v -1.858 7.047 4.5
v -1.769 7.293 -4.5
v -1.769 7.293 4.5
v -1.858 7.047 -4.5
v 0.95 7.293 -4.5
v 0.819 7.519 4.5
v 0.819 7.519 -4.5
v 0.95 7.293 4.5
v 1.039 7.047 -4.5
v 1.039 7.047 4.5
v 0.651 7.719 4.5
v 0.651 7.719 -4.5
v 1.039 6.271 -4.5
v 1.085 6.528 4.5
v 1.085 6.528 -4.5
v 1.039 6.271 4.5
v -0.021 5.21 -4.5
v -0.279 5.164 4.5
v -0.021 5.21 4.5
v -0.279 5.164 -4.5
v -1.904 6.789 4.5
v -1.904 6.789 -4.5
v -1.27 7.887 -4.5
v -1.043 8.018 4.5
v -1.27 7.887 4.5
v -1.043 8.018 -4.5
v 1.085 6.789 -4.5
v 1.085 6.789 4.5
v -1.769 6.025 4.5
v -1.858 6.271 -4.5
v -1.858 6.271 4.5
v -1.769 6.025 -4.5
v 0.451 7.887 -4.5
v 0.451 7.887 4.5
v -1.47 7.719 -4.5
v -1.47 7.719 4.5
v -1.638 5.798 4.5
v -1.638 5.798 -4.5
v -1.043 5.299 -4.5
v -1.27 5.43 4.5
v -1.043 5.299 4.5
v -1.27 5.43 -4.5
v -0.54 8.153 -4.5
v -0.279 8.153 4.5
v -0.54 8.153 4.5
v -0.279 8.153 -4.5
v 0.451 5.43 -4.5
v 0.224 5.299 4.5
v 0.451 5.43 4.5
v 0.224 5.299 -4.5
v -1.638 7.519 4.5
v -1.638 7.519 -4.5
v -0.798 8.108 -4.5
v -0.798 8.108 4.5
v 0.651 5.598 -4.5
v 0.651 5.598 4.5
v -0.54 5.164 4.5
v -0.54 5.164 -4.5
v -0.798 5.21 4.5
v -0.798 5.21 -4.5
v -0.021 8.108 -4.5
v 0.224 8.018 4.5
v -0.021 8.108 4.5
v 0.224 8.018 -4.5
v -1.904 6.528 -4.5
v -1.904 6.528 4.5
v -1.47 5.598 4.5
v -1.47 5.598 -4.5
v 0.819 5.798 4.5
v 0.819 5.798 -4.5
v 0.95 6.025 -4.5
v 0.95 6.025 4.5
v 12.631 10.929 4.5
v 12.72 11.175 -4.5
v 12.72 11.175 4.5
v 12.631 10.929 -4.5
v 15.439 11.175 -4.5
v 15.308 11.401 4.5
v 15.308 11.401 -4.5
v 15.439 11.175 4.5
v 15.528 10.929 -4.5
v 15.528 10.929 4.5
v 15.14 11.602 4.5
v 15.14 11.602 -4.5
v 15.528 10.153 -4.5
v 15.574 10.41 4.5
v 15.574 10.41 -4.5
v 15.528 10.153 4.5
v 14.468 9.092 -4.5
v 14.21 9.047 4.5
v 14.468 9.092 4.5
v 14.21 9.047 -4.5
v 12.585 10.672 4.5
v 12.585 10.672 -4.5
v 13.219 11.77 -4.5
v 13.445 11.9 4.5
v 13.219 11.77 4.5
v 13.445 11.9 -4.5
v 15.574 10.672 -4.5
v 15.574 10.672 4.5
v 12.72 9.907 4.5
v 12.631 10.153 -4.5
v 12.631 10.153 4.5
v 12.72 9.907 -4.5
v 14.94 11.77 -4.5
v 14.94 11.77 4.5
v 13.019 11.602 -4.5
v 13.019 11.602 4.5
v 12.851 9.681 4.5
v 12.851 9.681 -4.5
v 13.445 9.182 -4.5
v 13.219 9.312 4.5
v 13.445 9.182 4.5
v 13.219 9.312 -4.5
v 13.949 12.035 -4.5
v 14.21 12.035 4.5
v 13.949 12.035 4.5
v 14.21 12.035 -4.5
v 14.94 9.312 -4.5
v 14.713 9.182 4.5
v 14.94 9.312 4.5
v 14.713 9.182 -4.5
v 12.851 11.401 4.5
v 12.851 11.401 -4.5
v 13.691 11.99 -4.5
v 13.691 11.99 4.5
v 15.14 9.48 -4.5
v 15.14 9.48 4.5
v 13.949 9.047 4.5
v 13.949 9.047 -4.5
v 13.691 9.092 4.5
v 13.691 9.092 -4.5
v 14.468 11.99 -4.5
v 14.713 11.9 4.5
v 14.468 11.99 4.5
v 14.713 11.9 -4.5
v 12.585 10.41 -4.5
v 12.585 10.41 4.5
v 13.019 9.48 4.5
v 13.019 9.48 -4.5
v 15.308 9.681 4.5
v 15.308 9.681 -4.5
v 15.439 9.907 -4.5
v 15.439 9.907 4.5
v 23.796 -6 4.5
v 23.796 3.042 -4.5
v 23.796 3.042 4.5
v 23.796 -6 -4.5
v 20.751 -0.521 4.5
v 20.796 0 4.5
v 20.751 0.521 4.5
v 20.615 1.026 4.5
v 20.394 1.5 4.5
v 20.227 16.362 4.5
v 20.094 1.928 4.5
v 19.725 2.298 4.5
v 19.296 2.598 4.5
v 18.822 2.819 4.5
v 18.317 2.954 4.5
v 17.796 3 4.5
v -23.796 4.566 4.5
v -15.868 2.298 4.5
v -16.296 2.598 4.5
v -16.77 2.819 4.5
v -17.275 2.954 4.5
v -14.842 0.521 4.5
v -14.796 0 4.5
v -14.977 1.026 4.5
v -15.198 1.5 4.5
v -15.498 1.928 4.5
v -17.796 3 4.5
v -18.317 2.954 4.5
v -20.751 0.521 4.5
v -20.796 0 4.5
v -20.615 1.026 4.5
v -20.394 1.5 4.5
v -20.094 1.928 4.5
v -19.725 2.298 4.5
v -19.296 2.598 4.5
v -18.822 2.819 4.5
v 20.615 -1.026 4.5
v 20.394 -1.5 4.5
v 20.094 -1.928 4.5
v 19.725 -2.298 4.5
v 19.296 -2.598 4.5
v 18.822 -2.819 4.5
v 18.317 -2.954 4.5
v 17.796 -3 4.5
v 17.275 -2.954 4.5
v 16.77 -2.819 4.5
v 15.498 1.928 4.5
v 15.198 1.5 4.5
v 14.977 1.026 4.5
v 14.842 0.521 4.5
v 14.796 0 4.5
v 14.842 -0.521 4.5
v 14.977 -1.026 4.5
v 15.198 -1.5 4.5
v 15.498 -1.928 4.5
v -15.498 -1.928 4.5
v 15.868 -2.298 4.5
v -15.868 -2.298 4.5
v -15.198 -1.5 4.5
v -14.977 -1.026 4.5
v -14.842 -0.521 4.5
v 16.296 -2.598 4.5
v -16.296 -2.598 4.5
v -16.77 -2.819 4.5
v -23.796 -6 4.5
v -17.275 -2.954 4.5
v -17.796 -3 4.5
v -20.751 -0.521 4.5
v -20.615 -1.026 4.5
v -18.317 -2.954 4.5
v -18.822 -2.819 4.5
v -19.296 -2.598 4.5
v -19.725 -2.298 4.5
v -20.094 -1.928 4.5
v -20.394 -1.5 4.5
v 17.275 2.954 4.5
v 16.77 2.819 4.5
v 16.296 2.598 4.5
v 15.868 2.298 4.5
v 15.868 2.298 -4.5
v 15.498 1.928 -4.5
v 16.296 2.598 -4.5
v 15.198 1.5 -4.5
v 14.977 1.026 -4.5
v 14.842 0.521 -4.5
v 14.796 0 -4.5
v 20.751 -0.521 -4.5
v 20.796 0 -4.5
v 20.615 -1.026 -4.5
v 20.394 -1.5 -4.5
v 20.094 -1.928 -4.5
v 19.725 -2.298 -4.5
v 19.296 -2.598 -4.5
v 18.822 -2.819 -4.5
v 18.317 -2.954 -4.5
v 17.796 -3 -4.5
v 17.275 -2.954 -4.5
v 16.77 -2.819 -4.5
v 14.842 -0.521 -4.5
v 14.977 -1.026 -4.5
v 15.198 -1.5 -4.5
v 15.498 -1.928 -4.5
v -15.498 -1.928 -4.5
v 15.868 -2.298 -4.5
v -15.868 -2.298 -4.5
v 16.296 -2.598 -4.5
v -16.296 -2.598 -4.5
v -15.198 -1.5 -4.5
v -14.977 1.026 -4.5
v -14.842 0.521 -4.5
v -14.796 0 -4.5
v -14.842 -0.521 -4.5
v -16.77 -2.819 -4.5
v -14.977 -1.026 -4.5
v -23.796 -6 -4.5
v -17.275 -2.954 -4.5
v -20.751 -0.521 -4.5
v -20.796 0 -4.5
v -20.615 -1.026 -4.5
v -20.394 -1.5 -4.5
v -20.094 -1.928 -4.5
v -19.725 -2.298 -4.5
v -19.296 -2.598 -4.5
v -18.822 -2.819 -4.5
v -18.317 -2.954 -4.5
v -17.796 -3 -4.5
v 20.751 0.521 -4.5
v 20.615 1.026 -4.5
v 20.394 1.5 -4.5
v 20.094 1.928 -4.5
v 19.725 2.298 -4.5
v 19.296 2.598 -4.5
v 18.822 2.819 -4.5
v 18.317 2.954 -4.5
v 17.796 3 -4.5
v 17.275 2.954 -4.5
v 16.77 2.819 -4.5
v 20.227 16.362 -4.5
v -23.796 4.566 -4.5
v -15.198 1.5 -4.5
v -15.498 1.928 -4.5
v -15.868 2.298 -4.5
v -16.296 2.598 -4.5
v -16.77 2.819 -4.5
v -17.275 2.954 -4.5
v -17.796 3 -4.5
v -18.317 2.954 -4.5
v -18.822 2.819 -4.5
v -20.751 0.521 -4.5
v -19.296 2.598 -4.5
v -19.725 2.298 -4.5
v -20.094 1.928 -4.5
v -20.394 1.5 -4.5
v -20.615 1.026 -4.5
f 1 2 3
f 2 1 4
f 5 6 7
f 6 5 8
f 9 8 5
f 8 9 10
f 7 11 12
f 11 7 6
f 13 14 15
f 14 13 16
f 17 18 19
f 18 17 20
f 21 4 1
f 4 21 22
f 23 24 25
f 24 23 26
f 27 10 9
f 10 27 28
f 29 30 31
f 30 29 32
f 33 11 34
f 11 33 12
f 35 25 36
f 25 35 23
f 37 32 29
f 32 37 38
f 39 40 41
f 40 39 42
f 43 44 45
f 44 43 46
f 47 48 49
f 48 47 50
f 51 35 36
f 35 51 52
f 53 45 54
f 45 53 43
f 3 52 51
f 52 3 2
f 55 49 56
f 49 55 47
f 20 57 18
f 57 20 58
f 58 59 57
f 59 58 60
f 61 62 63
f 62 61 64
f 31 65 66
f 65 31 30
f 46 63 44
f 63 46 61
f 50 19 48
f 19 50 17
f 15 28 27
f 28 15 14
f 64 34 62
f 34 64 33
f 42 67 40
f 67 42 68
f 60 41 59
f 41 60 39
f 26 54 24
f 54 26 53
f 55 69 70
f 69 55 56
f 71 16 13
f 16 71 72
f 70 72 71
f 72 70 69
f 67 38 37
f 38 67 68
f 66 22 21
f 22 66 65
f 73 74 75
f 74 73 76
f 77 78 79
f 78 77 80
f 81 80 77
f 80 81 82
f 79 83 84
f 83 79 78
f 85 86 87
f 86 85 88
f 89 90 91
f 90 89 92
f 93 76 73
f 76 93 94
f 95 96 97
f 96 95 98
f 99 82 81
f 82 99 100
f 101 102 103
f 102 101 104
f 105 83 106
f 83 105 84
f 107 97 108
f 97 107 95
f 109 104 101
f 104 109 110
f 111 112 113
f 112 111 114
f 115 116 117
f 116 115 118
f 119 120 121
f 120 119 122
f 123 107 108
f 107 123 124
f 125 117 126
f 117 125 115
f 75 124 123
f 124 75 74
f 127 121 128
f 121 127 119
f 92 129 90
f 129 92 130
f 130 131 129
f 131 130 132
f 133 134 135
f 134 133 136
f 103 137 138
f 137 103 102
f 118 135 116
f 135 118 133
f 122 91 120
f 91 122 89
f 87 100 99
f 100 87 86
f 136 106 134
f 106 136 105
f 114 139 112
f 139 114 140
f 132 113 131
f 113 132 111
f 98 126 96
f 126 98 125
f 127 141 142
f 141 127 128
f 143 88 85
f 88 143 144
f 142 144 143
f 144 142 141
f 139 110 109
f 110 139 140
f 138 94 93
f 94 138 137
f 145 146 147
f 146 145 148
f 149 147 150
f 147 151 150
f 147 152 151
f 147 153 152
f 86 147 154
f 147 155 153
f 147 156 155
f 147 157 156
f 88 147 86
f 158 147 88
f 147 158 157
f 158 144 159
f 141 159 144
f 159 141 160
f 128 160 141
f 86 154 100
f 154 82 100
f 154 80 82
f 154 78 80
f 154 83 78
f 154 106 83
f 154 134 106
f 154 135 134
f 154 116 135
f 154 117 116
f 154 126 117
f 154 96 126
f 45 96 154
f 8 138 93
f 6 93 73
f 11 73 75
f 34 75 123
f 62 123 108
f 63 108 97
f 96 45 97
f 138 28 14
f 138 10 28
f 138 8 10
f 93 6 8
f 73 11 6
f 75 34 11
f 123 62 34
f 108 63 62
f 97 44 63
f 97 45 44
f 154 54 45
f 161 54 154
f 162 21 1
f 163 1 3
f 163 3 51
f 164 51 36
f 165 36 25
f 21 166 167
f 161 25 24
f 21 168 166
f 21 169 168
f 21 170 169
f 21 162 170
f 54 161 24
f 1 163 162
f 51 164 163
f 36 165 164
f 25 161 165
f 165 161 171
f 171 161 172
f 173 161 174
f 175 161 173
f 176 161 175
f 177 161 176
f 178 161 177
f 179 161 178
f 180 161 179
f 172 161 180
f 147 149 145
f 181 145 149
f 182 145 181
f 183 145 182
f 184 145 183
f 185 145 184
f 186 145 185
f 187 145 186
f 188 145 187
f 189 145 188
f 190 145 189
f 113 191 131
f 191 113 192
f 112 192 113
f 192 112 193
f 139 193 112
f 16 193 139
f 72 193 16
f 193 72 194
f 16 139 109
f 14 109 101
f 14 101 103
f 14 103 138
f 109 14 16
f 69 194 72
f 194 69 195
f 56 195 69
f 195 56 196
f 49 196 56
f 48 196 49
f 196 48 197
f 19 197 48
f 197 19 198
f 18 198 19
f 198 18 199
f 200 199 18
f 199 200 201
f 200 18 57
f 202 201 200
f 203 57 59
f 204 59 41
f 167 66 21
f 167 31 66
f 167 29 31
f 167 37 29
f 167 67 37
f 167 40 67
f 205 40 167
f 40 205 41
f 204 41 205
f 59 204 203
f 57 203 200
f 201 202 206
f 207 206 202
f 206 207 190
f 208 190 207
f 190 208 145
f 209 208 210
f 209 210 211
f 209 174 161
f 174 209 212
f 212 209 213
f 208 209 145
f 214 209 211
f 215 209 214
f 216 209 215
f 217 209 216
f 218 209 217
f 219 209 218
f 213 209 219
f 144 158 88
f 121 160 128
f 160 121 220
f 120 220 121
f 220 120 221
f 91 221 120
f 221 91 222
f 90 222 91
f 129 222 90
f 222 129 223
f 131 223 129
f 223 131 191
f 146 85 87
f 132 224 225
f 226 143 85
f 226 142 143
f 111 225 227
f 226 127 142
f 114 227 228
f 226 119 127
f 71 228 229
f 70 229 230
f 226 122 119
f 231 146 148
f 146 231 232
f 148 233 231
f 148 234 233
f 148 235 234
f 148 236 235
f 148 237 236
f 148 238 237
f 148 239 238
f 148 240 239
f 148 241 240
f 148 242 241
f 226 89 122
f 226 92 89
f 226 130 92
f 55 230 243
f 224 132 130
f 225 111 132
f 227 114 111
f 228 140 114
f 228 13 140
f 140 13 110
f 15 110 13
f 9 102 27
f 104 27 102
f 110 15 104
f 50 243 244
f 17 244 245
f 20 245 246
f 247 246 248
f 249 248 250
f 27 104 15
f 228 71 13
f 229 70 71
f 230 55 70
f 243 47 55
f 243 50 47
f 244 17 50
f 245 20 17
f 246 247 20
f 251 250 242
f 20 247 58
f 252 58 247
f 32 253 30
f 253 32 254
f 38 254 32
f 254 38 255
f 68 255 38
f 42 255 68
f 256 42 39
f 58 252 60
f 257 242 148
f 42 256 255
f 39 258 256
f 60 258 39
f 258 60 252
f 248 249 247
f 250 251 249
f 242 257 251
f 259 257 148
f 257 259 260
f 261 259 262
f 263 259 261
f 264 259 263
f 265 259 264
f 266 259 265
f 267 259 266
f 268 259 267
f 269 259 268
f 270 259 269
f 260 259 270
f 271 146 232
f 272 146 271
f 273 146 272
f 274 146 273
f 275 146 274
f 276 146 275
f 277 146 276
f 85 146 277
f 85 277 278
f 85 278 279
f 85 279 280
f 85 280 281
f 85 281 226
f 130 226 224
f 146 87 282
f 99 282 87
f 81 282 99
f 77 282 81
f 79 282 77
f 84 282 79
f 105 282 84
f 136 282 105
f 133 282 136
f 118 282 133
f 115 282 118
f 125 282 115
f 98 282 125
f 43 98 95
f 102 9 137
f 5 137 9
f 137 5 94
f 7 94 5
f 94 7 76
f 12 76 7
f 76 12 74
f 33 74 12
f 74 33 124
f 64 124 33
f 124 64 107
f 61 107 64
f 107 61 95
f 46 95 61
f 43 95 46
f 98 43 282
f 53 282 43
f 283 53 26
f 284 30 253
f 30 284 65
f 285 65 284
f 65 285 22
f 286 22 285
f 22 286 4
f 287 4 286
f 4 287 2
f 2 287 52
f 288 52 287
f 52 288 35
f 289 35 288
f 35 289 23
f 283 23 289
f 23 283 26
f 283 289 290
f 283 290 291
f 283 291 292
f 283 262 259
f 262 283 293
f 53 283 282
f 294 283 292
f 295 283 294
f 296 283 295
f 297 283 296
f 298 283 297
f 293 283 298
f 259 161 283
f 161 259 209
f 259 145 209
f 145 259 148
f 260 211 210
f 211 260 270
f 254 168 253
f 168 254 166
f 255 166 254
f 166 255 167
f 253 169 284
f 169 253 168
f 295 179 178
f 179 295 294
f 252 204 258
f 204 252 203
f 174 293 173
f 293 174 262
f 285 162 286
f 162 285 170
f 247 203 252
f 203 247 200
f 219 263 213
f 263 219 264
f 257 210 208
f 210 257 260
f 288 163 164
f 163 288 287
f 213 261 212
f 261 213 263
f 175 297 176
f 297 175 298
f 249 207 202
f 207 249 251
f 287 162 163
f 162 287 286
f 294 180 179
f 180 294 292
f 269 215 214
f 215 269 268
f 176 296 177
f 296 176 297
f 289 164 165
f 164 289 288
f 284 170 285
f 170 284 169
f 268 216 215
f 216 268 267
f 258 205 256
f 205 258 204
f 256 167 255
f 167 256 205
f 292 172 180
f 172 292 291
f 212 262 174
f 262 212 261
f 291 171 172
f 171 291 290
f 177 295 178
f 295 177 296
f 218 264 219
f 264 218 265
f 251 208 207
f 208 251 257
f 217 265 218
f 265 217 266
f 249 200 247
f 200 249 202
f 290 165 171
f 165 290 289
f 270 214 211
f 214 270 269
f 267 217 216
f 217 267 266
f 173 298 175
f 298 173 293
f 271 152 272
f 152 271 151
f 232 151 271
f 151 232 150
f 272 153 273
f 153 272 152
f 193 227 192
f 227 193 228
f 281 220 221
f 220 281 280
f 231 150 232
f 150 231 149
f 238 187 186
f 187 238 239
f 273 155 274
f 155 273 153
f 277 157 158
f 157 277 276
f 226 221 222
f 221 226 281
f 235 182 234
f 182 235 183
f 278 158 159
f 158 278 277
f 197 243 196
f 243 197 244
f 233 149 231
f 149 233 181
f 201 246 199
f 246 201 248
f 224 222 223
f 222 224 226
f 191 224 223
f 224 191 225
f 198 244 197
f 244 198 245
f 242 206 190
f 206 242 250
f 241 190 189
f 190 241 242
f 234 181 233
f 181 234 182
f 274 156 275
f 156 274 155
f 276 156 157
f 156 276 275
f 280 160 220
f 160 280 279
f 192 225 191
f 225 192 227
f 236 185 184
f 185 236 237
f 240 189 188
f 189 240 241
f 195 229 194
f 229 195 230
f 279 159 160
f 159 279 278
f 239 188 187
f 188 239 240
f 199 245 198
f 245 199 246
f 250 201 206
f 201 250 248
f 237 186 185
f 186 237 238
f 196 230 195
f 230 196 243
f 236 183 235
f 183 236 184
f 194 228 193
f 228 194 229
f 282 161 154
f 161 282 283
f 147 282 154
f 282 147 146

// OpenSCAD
// file: library.scad
include <parameters.scad>;


// inner and outer product.  Why aren't these standard?!!!?

function ip(v1 = [0,0,0], v2 = [0,0,0]) = v1.x*v2.x + v1.y*v2.y + v1.z*v2.z;

function op(v1 = [0,0,0], v2 = [0,0,0]) = [v1.y*v2.z - v1.z*v2.y, v1.z*v2.x - v1.x*v2.z, v1.x*v2.y - v1.y*v2.x];

module nema14()
{
	color([1,0.4,0.4,1])
	union()
	{
		translate([0, 0, nema14_shaft_length/2 - nema14_shaft_projection - nema14_hub_depth])
			cylinder(r = nema14_shaft/2, h = nema14_shaft_length, center = true, $fn=20);
		translate([0, 0, -nema14_hub_depth])
			cylinder(r = nema14_hub/2, h = nema14_hub_depth*2, center = true, $fn=20);
		translate([0, 0, nema14_length/2])
			cube([nema14_square,nema14_square,nema14_length], center = true);
		union()
		{
			for ( x = [0:1] ) 
			for ( y = [0:1] )
			{
				translate([(x-0.5)*nema14_screws, (y-0.5)*nema14_screws, 0])
					cylinder(r = screwsize/2, h = 30, center = true, $fn=10);
			}
		}
	}


}

// Pentagon nut that matches a hexagon...

module pentanut(height=40)
{
	rotate([0,0,60])
	intersection()
	{
		translate([-nutsize,-nutsize*5,-20])
			cube([nutsize*10, nutsize*10,height]);
		rotate([0,0,60])
			translate([-nutsize,-nutsize*5,-20])
				cube([nutsize*10, nutsize*10,height]);
		rotate([0,0,120])
			translate([-nutsize,-nutsize*5,-20])
				cube([nutsize*10, nutsize*10,height]);
		rotate([0,0,180])
			translate([-nutsize,-nutsize*5,-20])
				cube([nutsize*10, nutsize*10,height]);
		rotate([0,0,240])
			translate([-nutsize,-nutsize*5,-20])
				cube([nutsize*10, nutsize*10,height]);
	}
}


// Make a RepRap teardrop with its axis along Z
// If truncated is true, chop the apex; if not, come to a point

// I stole this function from Erik...


module teardrop(radius, height, truncateMM)
{
	union()
	{
		if(truncateMM > 0)
		{
			intersection()
			{
				translate([truncateMM,0,height/2]) 
					scale([1,1,height])
						cube([radius*2.8275,radius*2,1],center=true);
				scale([1,1,height]) 
						rotate([0,0,3*45])
							cube([radius,radius,1]);
			}
		} else
		{
			scale([1,1,height])
				rotate([0,0,3*45])
					cube([radius,radius,1]);
		}
		cylinder(r=radius, h = height, $fn=20);
	}
}


// Make a ball-bearing holder cutout

module bearing_holder(radius = 6.5)
{
	union()
	{
		cylinder (h = radius*5, r = radius, center = true, $fn = 20);
		for(i=[0:2])
		{
			rotate([0,0,120*i])
				translate([radius+screwsize/2, 0, 0])
					union()
					{
						cylinder (h = radius*5, r = screwsize/2, center = true, $fn = 20);
						translate([-screwsize, 0, 0])
							cube([2*screwsize, screwsize, radius*5], center = true);
					}
		}
	}
}

// Make a cuboid with a 45 degree top for vertical slots etc

module cen_hat(size)
{
	translate([0, 0, size.x/sqrt(2)])
		union()
		{
			rotate([0, 45, 0])
				cube([size.x, size.y, 5*max(size.x, max(size.y, size.z))], center=true);
			rotate([0, -45, 0])
				cube([size.x, size.y, 5*max(size.x, max(size.y, size.z))], center=true);
		}
}

module hat_cube(size = [1,1,1], center = false)
{
	difference()
	{
		cube(size, center);
		if(center)
			translate([0, 0, size.z/2])
				cen_hat(size);
		else
			translate([size.x/2, size.y/2, size.z])
				cen_hat(size);
	}
}



module rod(length, threaded) if (threaded && renderrodthreads) {
	linear_extrude(height = length, center = true, convexity = 10, twist = -360 * length / rodpitch, $fn = fn)
		translate([rodsize * 0.1 / 2, 0, 0])
			circle(r = rodsize * 0.9 / 2, $fn = fn);
} else cylinder(h = length, r = rodsize / 2, center = true, $fn = fn);


module rodnut(position, washer) render() translate([0, 0, position]) {
	intersection() {
		scale([1, 1, 0.5]) sphere(r = 1.05 * rodsize, center = true);
		difference() {
			cylinder (h = rodnutsize, r = rodnutdiameter / 2, center = true, $fn = 6);
			rod(rodnutsize + 0.1);
		}
	}
	if (washer == 1 || washer == 4) rodwasher(((position > 0) ? -1 : 1) * (rodnutsize + rodwashersize) / 2);
	if (washer == 2 || washer == 4) rodwasher(((position > 0) ? 1 : -1) * (rodnutsize + rodwashersize) / 2);
}


module rodwasher(position) render() translate ([0, 0, position]) difference() {
	cylinder(r = rodwasherdiameter / 2, h = rodwashersize, center = true, $fn = fn);
	rod(rodwashersize + 0.1);
}


module screw(length, nutpos, washer, bearingpos = -1) union(){
	translate([0, 0, -length / 2]) if (renderscrewthreads) {
		linear_extrude(height = length, center = true, convexity = 10, twist = -360 * length / screwpitch, $fn = fn)
			translate([screwsize * 0.1 / 2, 0, 0])
				circle(r = screwsize * 0.9 / 2, $fn = fn);
	} else cylinder(h = length, r = screwsize / 2, center = true, $fn = fn);
	render() difference() {
		translate([0, 0, screwsize / 2]) cylinder(h = screwsize, r = screwsize, center = true, $fn = fn);
		translate([0, 0, screwsize]) cylinder(h = screwsize, r = screwsize / 2, center = true, $fn = 6);
	}
	if (washer > 0 && nutpos > 0) {
		washer(nutpos);
		nut(nutpos + washersize);
	} else if (nutpos > 0) nut(nutpos);
	if (bearingpos >= 0) bearing(bearingpos);
}


module bearing(position) render() translate([0, 0, -position - bearingwidth / 2]) union() {
	difference() {
		cylinder(h = bearingwidth, r = bearingsize / 2, center = true, $fn = fn);
		cylinder(h = bearingwidth * 2, r = bearingsize / 2 - 1, center = true, $fn = fn);
	}
	difference() {
		cylinder(h = bearingwidth - 0.5, r = bearingsize / 2 - 0.5, center = true, $fn = fn);
		cylinder(h = bearingwidth * 2, r = screwsize / 2 + 0.5, center = true, $fn = fn);
	}
	difference() {
		cylinder(h = bearingwidth, r = screwsize / 2 + 1, center = true, $fn = fn);
		cylinder(h = bearingwidth + 0.1, r = screwsize / 2, center = true, $fn = fn);
	}
}


module nut(position, washer) render() translate([0, 0, -position - nutsize / 2]) {
	intersection() {
		scale([1, 1, 0.5]) sphere(r = 1.05 * screwsize, center = true);
		difference() {
			cylinder (h = nutsize, r = nutdiameter / 2, center = true, $fn = 6);
			cylinder(r = screwsize / 2, h = nutsize + 0.1, center = true, $fn = fn);
		}
	}
	if (washer > 0) washer(0);
}


module washer(position) render() translate ([0, 0, -position - washersize / 2]) difference() {
	cylinder(r = washerdiameter / 2, h = washersize, center = true, $fn = fn);
	cylinder(r = screwsize / 2, h = washersize + 0.1, center = true, $fn = fn);
}


//rod(20);
//translate([rodsize * 2.5, 0, 0]) rod(20, true);
//translate([rodsize * 5, 0, 0]) screw(10, true);
//translate([rodsize * 7.5, 0, 0]) bearing();
//translate([rodsize * 10, 0, 0]) rodnut();
//translate([rodsize * 12.5, 0, 0]) rodwasher();
//translate([rodsize * 15, 0, 0]) nut();
//translate([rodsize * 17.5, 0, 0]) washer();

//hat_cube(size=[2,40,2], center=false);

//bearing_holder();

pentanut();
// file: parameters.scad
// Parameters file for RepRap Huxley

pi=3.14159265;

// The relative location in your file system where the .dxf files are
// DXFs are for quick development.  They should be replaced by parameterised CSG in dure course.

fileroot="DXF-files/";

rodsize = 6;	//threaded/smooth rod diameter in mm
xaxis = 182.5;	//width of base in mm
yaxis = 266.5;	//length of base in mm


screwsize = 3;	//bearing bore/screw diameter in mm
bearingsize = 10;	//outer diameter of bearings in mm
bearingwidth = 4;	//width of bearings in mm


rodpitch = rodsize / 6;
rodnutsize = 0.8 * rodsize;
rodnutdiameter = 1.9 * rodsize;
rodwashersize = 0.2 * rodsize;
rodwasherdiameter = 2 * rodsize;
screwpitch = screwsize / 6;
nutsize = 0.8 * screwsize;
nutdiameter = 1.9 * screwsize;
washersize = 0.2 * screwsize;
washerdiameter = 2 * screwsize;
partthick = 2 * rodsize;
vertexrodspace = 2 * rodsize;


c = [0.3, 0.3, 0.3];
rodendoffset = rodnutsize + rodwashersize * 2 + partthick / 2;
vertexoffset = vertexrodspace + rodendoffset;


renderrodthreads = false;
renderscrewthreads = false;
fn = 36;

// The gap between the joining rods at a vertex

vertex_radius=sqrt(rodsize*rodsize + vertexoffset*vertexoffset);
vertex_ang = atan(vertexoffset/rodsize)-30;
vertex_gap = 2*vertex_radius*cos(vertex_ang);

// Nema 14 dimensions - these are absolute

nema14_square=35.3;
nema14_screws=26;
nema14_hub=22;
nema14_hub_depth=2;
nema14_length=36;
nema14_shaft=5;
nema14_shaft_length=66;
nema14_shaft_projection=19;

// The RepRap slide bearings

bearing_mount_centres=18;
bearing_width=7;

// X axis parameters - many should be relative

motor_center_y = 26;
bar_clamp_x=5;
bar_clamp_y=8;
bar_clamp_x_gap=23;
bearing_y=50;
bearing_x=bar_clamp_x_gap + 10;
hole_land=4;
thickness=5;
bearing_low_z = 8;
bearing_z_gap = 25;
bearing_plate_width = bearing_mount_centres+2*hole_land + 10;
bearing_plate_overlap=0.5;
bearing_plate_support=10;
// main file
include <parameters.scad>;
use <library.scad>;

module y_idler()
{


	difference()
	{
		translate([0, rodsize, 0])
			cube([vertex_gap+2*rodsize, 4*rodsize, 1.5*rodsize], center = true);

		translate([-vertex_gap/2, 0, 0]) 
			cylinder(h = 3*rodsize, r = rodsize / 2, center = true, $fn = fn);
		translate([vertex_gap/2, 0, 0]) 
			cylinder(h = 3*rodsize, r = rodsize / 2, center = true, $fn = fn);

		translate([0, 7*rodsize, 0])
			rotate([0,0,15])
				cube([2*(vertex_gap+rodsize), 10*rodsize, 3*rodsize], center = true);	
		translate([5.6*rodsize, 6*rodsize, 0])
			rotate([0,0,105])
				cube([2*(vertex_gap+rodsize), 6*rodsize, 3*rodsize], center = true);

		translate([-vertex_gap/2, rodsize/3, 0])
			rotate([0,0,15])
			{
				translate([3*rodsize, 0, 0])
					cylinder(h = 3*rodsize, r = screwsize / 2, center = true, $fn = fn);
				translate([5.5*rodsize, 0, 0])
					cylinder(h = 3*rodsize, r = screwsize / 2, center = true, $fn = fn);
			}
	}
}

y_idler();
